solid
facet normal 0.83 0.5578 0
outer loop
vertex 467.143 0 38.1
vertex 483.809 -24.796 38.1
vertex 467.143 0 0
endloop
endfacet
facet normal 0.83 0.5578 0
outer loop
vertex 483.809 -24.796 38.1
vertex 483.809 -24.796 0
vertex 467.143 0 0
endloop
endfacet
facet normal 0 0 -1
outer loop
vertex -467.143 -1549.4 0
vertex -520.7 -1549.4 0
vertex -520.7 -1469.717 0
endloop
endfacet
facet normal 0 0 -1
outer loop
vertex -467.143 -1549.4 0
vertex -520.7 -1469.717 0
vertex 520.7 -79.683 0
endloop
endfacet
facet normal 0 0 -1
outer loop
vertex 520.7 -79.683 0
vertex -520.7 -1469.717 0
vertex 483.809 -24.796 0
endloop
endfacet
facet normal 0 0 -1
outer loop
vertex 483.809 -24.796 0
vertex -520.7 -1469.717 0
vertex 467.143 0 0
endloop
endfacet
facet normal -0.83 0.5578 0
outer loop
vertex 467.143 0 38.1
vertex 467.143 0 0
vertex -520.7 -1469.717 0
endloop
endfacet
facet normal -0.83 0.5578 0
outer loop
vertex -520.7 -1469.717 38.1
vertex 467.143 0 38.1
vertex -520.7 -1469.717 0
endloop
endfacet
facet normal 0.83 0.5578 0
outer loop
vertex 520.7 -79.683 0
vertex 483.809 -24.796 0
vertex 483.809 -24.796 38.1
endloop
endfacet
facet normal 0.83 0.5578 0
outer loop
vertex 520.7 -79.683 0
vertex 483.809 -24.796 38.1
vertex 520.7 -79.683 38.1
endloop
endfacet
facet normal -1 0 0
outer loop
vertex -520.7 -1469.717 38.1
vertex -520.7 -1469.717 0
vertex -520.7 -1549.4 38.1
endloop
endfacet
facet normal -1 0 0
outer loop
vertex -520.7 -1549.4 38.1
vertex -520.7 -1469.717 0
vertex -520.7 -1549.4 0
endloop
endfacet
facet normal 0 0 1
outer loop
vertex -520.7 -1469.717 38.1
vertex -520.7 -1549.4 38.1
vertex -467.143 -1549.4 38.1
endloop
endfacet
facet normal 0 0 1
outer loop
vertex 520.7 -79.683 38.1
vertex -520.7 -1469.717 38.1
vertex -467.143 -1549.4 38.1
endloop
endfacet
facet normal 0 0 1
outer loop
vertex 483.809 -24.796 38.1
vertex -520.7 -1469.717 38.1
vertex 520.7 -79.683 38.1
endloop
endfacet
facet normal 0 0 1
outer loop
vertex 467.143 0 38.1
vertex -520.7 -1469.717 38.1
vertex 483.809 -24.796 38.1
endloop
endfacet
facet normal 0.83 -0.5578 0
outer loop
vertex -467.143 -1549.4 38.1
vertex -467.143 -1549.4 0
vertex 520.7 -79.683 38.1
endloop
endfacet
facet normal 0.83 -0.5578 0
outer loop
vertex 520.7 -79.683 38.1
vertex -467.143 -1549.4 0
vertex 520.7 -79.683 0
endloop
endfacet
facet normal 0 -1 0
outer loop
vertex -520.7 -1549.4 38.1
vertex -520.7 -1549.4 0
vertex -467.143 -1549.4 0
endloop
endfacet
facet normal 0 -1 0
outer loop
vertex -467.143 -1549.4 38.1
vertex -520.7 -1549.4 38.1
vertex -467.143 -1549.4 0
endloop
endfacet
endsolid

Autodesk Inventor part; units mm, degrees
ref_plane "YZ Plane" through (0, 0, 0) normal (1, 0, 0) x (0, 1, 0)
ref_plane "XZ Plane" through (0, 0, 0) normal (0, 1, 0) x (-1, 0, 0)
ref_plane "XY Plane" through (0, 0, 0) normal (0, 0, 1) x (1, 0, 0)
sketch "Sketch1" plane through (0, 0, 0) normal (0, 0, 1) x (1, 0, 0)
  line L0 (-520.7, -1549.4) -> (520.7, -1549.4)
  line L1 (520.7, -1549.4) -> (520.7, 1549.4)
  line L2 (520.7, 1549.4) -> (-520.7, 1549.4)
  line L3 (-520.7, 1549.4) -> (-520.7, -1549.4)
  line L4 (-520.7, -1549.4) -> (520.7, 1549.4) construction
  line L5 (520.7, -1549.4) -> (-520.7, 1549.4) construction
  line L6 (-520.7, 0) -> (520.7, 0)
  line L7 (520.7, 0) -> (-520.7, -1549.4)
  line L8 (-483.8087, -1574.1958) -> (-557.5913, -1524.6042)
  line L9 (557.5913, -24.7958) -> (483.8087, 24.7958)
  line L10 (483.8087, 24.7958) -> (-557.5913, -1524.6042)
  line L11 (-483.8087, -1574.1958) -> (557.5913, -24.7958)
  line L12 (483.8087, 24.7958) -> (520.7, 79.6829)
  line L13 (-520.7, 1549.4) -> (520.7, -1549.4) construction
  line L14 (520.7, 0) -> (-520.7, 1549.4)
  line L15 (-483.8087, 1574.1958) -> (-557.5913, 1524.6042)
  line L16 (557.5913, 24.7958) -> (483.8087, -24.7958)
  line L17 (483.8087, -24.7958) -> (-557.5913, 1524.6042)
  line L18 (-483.8087, 1574.1958) -> (557.5913, 24.7958)
  line L19 (483.8087, -24.7958) -> (520.7, -79.6829)
  point P0 (0, 0)
  point P1 (520.7, 79.6829)
  point P2 (-467.1426, 1549.4)
  point P3 (-520.7, 1469.7171)
  point P4 (520.7, -79.6829)
  point P5 (520.7, -79.6829)
  point P6 (467.1426, 0)
  point P7 (-520.7, -1469.7171)
  point P8 (-467.1426, -1549.4)
  dimension "d0" = 1041.4
  dimension "d1" = 3098.8
  dimension "d3" = 88.9
  dimension "d4" = 88.9
extrude "Extrusion1" add sketch "Sketch1" along normal blind 38.1 contours L7 L19 L11 L0 | L3 L10 L17 L19 L7
properties part number "S_2x4x73.498"
